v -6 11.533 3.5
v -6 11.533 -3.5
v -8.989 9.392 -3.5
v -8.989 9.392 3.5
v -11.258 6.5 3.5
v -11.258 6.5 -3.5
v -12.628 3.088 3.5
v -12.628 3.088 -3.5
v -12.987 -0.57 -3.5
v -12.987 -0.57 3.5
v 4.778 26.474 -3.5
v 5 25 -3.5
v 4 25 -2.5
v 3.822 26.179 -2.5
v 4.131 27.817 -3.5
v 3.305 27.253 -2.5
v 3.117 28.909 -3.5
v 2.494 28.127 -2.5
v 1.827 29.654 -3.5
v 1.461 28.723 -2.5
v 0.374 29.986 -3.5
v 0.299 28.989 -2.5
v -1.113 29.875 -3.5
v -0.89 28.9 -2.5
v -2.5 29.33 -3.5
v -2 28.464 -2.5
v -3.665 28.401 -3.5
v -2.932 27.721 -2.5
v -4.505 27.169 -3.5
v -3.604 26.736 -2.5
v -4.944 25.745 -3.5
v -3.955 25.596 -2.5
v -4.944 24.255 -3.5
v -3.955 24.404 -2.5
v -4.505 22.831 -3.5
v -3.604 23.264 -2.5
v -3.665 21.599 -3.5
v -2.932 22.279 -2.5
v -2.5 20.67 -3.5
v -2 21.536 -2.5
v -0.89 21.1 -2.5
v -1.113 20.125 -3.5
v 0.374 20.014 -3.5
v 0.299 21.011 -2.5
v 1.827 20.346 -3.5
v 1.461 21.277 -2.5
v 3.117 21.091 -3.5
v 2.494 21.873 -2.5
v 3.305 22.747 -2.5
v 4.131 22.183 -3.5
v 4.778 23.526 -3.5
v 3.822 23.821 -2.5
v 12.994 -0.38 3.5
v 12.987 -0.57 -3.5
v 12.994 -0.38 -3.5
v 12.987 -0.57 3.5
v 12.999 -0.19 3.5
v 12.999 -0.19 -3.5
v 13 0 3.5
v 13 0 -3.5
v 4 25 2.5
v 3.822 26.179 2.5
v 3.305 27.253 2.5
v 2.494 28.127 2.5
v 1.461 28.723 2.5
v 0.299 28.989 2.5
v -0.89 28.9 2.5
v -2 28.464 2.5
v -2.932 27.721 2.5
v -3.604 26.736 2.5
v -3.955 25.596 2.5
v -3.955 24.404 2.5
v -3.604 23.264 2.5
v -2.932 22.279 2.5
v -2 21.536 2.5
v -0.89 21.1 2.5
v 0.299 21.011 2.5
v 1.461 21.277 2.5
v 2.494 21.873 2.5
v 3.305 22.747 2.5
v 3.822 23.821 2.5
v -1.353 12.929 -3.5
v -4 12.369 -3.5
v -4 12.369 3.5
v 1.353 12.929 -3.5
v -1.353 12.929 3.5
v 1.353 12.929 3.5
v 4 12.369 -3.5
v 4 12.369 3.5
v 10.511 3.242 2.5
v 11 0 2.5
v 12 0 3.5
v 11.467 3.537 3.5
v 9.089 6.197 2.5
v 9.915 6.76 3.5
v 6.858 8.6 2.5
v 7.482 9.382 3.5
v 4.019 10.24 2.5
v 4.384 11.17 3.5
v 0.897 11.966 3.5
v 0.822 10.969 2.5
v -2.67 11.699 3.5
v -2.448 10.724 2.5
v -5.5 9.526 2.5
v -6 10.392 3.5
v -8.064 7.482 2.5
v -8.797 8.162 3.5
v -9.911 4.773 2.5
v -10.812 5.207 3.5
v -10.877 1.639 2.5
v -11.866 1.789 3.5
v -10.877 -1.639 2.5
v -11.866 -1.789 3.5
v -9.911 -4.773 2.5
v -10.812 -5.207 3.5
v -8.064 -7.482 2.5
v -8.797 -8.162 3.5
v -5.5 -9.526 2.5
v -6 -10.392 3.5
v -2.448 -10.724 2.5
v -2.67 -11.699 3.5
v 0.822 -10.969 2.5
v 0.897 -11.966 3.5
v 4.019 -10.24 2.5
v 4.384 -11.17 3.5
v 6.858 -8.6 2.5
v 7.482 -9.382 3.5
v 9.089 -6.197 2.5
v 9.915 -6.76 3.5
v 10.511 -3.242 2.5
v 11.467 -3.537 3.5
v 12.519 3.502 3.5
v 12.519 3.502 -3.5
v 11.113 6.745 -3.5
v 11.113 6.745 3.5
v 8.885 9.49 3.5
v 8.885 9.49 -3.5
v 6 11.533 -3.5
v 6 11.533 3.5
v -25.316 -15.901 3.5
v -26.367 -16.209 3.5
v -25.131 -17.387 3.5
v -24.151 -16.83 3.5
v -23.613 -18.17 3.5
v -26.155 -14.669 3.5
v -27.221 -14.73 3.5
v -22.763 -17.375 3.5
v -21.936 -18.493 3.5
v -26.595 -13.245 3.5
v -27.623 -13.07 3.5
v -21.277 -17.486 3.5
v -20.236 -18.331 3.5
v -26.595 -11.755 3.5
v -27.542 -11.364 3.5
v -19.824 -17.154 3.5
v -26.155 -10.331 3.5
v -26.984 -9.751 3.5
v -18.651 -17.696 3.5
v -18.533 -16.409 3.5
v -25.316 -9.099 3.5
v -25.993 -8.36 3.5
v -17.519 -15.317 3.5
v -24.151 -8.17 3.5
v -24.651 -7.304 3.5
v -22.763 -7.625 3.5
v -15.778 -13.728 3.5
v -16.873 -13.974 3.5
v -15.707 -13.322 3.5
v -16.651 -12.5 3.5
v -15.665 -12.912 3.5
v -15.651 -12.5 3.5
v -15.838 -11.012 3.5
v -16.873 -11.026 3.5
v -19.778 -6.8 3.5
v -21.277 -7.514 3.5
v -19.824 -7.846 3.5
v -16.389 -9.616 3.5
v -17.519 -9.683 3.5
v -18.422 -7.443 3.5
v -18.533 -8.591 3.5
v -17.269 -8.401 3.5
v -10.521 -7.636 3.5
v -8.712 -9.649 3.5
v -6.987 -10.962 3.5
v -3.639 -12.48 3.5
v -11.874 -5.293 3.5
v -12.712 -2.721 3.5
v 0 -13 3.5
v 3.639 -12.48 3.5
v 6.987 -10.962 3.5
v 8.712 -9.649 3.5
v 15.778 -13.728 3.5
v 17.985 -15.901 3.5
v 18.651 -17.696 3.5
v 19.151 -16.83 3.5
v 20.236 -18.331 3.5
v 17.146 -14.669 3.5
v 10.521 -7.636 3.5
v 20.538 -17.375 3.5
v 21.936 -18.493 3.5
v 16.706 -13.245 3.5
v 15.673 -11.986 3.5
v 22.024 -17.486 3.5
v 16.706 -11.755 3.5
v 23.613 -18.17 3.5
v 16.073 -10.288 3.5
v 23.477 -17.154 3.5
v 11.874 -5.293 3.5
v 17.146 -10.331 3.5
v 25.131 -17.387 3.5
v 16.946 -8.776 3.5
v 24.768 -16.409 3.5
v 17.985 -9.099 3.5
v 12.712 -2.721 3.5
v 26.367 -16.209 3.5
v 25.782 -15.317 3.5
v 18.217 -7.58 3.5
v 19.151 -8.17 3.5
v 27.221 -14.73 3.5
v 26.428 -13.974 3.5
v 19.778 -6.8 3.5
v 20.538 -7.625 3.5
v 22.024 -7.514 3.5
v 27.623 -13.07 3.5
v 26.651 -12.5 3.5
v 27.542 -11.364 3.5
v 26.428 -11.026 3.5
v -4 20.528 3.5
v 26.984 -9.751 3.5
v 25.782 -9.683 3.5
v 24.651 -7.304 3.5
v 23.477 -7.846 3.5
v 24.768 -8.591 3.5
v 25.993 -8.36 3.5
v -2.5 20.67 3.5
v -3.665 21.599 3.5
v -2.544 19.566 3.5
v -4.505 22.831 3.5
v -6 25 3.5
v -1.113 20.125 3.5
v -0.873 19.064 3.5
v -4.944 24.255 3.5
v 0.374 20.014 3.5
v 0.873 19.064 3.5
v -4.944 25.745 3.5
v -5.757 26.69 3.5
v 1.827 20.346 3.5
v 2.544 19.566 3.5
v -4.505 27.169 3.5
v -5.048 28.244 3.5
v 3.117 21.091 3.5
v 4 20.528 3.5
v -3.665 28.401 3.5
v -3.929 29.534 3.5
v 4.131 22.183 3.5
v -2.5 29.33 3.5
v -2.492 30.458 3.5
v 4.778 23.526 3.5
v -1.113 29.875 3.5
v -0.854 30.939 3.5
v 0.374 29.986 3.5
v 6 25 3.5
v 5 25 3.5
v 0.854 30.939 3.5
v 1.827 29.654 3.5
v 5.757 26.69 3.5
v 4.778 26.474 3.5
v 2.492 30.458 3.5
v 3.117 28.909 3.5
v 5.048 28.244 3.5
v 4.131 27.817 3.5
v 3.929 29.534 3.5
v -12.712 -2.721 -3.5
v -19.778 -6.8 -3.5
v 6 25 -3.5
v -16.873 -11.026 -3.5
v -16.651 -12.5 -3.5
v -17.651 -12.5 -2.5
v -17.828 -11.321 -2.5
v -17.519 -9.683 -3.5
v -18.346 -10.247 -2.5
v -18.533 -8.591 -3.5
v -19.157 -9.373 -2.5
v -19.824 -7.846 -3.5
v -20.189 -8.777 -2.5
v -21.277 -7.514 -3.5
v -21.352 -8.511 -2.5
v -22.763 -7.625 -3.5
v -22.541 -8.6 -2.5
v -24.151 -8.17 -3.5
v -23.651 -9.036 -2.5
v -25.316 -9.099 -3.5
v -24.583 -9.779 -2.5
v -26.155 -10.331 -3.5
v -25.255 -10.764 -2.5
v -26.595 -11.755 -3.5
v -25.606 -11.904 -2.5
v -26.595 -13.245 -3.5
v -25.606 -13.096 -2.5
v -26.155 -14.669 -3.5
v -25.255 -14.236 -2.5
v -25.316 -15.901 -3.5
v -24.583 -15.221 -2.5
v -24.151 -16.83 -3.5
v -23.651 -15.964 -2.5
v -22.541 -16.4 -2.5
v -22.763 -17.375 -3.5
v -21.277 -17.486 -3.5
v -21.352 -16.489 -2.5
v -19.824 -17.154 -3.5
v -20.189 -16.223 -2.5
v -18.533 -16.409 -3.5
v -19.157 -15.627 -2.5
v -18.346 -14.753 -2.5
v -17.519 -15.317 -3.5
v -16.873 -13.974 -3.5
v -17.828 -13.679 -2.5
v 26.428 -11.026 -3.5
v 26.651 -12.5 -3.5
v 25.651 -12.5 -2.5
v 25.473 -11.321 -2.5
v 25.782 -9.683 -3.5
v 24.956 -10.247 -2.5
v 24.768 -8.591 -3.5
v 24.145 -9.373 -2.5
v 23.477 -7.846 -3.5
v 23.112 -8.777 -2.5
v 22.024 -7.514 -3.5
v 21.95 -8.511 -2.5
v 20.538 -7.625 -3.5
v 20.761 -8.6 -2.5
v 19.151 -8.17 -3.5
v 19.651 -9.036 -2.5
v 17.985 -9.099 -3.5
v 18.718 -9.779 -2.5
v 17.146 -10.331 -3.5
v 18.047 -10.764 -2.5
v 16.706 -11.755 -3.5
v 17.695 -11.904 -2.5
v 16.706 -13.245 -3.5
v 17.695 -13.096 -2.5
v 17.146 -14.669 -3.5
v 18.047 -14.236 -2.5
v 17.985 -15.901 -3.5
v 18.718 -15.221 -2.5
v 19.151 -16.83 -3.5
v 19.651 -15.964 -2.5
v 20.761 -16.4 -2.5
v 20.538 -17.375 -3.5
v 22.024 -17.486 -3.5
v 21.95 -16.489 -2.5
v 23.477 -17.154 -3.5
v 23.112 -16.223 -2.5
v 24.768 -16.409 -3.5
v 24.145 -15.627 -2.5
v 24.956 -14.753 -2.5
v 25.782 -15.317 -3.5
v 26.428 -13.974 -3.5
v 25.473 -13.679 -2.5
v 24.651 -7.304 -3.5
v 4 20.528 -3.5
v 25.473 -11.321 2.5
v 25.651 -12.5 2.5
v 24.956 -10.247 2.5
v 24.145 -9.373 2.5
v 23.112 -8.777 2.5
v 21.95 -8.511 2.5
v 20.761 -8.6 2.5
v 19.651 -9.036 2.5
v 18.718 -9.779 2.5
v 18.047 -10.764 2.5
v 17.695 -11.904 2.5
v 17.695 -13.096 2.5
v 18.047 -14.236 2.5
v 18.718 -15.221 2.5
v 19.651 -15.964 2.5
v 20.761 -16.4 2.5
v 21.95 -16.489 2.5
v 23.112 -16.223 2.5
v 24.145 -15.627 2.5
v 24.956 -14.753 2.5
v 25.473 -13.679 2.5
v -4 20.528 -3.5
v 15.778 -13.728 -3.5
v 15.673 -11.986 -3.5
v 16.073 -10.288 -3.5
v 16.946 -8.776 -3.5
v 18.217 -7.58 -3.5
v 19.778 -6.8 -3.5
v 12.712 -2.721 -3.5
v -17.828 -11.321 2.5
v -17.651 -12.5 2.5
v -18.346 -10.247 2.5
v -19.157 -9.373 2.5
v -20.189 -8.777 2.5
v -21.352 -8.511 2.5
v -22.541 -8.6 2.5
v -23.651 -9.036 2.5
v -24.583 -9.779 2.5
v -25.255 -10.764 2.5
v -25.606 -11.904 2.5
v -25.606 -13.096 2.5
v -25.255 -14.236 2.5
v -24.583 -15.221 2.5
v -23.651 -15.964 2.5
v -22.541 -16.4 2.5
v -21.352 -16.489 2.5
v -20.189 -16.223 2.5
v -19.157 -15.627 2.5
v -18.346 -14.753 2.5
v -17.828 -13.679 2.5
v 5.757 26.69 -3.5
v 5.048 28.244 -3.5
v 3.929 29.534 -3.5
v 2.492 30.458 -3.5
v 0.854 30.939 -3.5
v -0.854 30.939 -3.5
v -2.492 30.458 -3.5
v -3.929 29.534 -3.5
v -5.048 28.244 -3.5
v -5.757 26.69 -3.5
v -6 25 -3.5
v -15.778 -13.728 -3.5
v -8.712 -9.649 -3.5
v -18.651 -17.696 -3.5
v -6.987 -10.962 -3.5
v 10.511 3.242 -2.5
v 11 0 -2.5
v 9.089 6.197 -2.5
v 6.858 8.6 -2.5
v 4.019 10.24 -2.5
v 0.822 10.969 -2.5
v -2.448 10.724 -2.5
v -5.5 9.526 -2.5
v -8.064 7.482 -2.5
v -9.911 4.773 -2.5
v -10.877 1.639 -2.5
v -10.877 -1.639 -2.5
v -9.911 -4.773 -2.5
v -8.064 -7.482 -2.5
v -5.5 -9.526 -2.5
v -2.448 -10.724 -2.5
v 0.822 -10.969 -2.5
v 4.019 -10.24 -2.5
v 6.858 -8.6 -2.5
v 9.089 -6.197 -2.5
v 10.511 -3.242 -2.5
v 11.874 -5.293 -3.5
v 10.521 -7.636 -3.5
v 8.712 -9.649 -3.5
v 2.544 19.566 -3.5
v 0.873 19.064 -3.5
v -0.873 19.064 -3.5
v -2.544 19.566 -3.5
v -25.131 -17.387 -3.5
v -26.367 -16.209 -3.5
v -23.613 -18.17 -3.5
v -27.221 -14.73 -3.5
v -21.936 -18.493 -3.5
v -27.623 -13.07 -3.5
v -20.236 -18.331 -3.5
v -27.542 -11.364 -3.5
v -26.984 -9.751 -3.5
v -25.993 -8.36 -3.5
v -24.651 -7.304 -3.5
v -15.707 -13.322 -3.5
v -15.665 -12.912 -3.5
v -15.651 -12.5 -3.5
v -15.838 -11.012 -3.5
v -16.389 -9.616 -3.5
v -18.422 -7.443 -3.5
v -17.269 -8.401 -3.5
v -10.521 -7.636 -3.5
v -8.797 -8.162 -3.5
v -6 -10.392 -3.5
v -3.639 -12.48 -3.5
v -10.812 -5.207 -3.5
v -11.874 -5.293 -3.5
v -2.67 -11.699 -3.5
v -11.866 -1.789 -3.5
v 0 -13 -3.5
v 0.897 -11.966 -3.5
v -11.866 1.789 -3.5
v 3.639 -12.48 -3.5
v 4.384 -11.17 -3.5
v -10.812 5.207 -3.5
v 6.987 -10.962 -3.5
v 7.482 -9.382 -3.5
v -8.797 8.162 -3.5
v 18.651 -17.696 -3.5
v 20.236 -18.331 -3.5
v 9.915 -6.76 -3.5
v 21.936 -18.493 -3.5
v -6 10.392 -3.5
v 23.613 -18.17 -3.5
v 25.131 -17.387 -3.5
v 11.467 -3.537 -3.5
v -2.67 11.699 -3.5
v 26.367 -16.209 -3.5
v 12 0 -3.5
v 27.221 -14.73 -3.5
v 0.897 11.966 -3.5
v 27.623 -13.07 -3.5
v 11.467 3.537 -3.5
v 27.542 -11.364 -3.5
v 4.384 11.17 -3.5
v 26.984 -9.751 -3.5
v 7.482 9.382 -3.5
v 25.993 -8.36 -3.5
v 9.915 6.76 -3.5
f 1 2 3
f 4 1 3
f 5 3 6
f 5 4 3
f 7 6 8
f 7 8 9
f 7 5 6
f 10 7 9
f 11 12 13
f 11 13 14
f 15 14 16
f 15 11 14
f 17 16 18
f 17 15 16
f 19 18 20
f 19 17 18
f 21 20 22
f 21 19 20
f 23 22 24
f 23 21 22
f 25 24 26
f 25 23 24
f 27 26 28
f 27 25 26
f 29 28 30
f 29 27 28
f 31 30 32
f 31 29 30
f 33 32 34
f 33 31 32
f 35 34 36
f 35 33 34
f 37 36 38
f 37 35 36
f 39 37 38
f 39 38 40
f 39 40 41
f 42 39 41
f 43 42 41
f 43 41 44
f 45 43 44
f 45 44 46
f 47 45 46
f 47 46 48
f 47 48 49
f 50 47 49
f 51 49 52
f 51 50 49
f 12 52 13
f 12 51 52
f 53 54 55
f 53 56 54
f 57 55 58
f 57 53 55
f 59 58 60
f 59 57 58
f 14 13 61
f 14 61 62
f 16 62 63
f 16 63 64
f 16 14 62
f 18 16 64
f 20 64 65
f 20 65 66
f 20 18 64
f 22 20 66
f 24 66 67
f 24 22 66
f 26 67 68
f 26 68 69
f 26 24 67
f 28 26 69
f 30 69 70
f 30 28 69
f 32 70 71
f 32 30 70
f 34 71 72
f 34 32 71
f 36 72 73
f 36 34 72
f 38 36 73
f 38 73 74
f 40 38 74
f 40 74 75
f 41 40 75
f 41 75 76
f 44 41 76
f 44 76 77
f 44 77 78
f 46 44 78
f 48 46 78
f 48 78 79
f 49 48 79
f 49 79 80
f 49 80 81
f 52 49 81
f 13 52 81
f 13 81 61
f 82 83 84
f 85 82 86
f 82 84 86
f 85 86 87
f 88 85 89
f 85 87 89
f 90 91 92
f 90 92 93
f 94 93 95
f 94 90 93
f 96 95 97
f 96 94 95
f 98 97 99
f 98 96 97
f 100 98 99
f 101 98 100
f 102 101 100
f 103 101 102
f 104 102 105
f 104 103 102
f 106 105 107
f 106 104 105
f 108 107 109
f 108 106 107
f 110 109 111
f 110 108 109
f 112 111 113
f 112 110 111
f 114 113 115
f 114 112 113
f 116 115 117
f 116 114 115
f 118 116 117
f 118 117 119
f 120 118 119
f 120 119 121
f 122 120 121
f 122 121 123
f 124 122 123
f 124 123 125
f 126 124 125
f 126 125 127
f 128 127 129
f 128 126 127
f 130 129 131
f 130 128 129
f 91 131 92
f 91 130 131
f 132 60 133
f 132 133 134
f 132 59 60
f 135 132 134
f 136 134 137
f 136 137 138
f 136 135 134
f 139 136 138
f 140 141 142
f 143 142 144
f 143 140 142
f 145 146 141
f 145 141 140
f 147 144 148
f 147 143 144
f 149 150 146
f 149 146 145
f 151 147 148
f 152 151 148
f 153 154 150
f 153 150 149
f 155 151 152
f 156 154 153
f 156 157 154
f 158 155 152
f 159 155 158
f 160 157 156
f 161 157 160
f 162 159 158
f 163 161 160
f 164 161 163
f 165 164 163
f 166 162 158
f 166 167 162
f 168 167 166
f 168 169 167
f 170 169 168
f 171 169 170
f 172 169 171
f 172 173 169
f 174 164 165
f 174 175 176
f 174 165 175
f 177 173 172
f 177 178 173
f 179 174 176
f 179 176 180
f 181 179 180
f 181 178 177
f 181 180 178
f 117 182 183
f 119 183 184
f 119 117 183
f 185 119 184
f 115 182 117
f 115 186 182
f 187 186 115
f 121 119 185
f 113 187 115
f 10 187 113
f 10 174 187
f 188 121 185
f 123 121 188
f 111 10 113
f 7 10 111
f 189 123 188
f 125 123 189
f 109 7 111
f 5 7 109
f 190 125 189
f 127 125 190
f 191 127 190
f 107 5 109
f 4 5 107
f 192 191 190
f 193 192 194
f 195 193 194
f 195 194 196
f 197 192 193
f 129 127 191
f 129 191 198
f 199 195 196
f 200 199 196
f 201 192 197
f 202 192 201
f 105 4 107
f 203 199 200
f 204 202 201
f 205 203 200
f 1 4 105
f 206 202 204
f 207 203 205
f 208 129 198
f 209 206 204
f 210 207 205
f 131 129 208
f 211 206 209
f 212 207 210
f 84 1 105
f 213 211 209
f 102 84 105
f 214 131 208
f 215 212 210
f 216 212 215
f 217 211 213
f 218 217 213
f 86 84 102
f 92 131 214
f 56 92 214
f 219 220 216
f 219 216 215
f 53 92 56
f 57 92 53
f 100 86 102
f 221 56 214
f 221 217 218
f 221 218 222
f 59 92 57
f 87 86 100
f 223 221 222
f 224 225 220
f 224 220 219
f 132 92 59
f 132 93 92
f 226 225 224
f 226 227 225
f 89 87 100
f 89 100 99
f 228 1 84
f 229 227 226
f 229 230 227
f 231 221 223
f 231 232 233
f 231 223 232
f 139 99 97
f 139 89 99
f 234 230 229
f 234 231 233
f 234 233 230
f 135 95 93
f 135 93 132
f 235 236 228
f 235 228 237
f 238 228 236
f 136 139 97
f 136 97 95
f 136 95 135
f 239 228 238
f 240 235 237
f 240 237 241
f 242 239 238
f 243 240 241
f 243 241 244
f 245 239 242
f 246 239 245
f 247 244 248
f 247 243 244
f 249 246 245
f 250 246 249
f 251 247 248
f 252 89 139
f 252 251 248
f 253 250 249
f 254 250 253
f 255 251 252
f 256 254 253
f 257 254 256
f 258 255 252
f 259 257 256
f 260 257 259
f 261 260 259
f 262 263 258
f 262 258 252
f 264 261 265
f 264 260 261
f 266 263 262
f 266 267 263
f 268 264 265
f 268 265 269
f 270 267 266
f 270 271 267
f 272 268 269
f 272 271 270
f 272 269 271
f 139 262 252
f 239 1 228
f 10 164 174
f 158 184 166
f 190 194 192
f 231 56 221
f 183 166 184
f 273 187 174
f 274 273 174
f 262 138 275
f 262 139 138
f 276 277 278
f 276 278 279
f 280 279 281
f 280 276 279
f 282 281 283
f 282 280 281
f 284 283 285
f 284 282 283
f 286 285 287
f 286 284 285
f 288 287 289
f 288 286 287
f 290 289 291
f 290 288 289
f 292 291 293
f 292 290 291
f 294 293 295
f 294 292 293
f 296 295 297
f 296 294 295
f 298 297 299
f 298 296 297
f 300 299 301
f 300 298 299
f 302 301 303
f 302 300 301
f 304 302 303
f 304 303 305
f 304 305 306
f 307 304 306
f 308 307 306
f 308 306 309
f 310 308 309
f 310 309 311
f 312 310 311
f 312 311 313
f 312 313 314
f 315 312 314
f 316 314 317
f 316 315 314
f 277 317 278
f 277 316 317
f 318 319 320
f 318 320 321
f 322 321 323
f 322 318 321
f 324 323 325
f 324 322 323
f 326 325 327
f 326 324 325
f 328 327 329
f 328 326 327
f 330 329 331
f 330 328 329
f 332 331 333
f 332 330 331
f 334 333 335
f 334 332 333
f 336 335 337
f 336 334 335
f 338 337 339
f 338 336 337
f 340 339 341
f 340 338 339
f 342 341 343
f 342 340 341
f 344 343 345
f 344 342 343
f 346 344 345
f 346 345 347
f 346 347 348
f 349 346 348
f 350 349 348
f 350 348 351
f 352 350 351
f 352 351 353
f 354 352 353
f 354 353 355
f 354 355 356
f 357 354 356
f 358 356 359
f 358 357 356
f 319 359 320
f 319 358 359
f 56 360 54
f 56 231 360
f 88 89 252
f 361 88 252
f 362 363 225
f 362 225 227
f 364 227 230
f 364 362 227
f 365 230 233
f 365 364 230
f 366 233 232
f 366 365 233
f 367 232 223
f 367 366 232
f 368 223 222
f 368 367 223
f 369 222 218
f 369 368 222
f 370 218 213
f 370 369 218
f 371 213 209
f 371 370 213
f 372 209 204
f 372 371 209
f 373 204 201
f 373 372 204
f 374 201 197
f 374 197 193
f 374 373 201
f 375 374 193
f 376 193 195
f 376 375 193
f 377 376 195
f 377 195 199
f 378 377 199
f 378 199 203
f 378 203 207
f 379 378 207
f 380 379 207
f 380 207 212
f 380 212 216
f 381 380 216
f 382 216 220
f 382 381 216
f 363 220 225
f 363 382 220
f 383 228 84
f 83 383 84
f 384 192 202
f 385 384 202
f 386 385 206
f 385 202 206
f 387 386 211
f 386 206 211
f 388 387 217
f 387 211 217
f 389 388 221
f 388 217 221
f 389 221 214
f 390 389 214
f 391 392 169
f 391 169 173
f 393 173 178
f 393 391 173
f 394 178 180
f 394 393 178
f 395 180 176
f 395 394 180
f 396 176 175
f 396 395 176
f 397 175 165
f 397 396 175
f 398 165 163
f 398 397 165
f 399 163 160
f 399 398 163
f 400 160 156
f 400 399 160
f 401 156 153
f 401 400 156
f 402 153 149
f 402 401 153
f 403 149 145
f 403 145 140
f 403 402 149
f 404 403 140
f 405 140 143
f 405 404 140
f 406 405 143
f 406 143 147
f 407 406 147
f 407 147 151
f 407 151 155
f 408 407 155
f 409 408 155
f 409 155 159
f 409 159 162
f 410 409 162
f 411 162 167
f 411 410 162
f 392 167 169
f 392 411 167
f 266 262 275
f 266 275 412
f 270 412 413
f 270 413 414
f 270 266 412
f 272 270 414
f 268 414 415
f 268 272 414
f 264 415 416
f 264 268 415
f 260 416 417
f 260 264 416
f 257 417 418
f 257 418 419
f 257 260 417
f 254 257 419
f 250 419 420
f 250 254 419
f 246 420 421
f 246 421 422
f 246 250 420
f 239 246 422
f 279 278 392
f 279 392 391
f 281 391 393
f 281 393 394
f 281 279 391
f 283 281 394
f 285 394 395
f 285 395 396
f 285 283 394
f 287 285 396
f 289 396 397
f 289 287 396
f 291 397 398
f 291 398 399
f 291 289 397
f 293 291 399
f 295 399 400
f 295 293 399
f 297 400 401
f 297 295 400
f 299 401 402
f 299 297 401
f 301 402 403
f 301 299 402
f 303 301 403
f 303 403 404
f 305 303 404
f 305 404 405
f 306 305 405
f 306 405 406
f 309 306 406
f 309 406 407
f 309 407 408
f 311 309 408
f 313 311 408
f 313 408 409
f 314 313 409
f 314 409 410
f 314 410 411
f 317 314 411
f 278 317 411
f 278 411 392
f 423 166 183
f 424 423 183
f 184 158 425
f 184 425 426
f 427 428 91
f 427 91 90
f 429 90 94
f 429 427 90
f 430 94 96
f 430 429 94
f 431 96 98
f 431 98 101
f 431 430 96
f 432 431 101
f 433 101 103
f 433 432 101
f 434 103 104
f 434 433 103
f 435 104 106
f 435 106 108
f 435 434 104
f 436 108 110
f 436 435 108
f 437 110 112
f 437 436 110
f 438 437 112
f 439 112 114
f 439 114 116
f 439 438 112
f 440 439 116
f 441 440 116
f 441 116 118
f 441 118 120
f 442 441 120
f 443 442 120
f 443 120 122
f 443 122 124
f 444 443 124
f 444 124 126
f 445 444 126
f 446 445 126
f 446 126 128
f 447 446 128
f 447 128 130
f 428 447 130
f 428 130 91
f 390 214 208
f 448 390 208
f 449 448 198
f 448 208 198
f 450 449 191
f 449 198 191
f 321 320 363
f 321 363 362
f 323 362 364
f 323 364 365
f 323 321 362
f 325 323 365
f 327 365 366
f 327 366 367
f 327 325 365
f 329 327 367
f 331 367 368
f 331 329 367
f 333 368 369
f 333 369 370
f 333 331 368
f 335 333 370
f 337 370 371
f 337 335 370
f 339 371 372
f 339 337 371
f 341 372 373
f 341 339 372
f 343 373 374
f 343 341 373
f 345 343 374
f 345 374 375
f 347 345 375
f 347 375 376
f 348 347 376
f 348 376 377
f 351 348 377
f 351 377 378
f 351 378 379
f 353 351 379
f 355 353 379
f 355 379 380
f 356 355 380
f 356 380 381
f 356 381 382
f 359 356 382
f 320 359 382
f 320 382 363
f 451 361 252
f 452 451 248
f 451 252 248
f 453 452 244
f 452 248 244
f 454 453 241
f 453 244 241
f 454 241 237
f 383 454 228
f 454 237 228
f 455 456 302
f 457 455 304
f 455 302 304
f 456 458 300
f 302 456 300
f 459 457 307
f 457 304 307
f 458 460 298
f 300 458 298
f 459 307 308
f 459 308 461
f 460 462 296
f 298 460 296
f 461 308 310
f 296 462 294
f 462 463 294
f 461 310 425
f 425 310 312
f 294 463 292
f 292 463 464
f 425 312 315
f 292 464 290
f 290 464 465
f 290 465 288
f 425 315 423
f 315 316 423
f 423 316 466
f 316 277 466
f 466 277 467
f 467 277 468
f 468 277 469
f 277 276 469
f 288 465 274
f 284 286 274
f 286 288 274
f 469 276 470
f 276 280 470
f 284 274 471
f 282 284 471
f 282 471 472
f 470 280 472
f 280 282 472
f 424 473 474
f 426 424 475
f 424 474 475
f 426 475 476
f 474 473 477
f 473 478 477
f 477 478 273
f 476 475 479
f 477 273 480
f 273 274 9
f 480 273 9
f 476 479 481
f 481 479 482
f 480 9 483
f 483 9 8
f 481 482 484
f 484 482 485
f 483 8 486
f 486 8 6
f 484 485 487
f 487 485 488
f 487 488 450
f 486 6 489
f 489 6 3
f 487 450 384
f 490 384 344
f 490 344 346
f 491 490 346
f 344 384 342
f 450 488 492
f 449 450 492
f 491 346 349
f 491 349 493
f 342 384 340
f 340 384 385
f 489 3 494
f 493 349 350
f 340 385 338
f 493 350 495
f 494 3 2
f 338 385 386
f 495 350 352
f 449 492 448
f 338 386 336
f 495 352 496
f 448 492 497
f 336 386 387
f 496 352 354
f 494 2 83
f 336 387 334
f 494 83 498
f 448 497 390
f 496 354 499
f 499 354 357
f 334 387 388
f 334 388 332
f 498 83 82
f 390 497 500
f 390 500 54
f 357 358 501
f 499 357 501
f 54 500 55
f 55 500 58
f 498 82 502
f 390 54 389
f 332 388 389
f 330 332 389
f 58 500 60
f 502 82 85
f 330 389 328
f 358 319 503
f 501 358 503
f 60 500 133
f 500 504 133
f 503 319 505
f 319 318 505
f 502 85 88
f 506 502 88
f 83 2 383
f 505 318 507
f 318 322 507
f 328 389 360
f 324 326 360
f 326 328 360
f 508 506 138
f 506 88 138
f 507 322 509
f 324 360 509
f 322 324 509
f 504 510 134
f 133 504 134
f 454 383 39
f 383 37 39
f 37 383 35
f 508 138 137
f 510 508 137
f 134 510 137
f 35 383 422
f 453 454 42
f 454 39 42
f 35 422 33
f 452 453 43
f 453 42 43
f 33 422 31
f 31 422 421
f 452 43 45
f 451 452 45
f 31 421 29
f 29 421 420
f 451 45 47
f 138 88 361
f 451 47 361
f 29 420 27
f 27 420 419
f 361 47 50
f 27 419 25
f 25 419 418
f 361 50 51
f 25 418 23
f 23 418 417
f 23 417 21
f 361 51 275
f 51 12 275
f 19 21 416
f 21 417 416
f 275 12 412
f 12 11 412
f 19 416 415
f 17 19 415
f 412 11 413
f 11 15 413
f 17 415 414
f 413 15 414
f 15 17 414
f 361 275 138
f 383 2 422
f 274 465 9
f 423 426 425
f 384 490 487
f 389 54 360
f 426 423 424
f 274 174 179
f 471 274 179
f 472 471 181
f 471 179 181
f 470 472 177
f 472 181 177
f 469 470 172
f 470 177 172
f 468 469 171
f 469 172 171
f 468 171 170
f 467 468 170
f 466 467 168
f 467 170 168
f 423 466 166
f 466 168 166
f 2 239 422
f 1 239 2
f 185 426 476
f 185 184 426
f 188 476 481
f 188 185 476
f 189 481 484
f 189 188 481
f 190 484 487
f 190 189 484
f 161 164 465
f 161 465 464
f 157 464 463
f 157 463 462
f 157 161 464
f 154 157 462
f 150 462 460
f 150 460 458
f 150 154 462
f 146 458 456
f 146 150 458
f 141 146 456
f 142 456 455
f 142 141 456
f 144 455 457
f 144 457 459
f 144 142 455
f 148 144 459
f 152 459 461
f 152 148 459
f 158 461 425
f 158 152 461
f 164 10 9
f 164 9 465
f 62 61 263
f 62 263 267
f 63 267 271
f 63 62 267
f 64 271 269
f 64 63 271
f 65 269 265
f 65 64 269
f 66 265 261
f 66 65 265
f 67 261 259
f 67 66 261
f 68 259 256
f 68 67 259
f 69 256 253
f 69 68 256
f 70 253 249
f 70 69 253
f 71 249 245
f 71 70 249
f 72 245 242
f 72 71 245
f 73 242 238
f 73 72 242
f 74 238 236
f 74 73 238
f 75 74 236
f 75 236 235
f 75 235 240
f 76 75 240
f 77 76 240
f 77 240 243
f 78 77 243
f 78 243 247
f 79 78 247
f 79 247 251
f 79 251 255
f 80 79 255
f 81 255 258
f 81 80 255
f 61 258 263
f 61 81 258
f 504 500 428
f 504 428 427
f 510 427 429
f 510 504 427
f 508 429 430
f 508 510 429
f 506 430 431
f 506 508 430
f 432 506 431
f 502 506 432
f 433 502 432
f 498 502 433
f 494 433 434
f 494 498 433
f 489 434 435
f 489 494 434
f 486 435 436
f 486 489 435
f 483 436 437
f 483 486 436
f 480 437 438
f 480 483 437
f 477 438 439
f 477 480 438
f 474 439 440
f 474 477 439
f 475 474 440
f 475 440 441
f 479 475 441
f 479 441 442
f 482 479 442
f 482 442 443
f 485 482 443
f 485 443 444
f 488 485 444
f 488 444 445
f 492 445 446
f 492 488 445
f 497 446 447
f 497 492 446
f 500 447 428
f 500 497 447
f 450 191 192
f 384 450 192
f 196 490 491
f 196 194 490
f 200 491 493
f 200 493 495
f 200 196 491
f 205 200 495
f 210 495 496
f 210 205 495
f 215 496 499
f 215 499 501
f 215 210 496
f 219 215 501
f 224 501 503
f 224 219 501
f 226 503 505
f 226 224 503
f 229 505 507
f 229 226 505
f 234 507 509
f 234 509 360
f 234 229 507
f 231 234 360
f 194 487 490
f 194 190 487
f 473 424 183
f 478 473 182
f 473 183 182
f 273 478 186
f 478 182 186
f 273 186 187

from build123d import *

# Parameters (mm, degrees)
F0_R     = 11
F0_R_2   = 4
F1_DEPTH = 3.5
F2_SIZE  = 1
F4_DEPTH = 7.001


# Not quite as in the source:
# - a feature names something its author has since deleted; it is built from what else it names


with BuildPart() as f1:
    # F0 (on Top) → F1 (new body, symmetric)
    with BuildSketch(Plane.XY):
        with BuildLine():
            ThreePointArc((-6, 11.5325625947), (0, 13), (6, 11.5325625947))
            Line((6, 11.5325625947), (6, 25))
            ThreePointArc((6, 25), (0, 19), (-6, 25))
            Line((-6, 25), (-6, 11.5325625947))
        make_face()
        with BuildLine():
            ThreePointArc((-6.9874921777, -10.96243372), (-11.2583302492, -6.5), (-12.9874921777, -0.5701288746))
            Line((-12.9874921777, -0.5701288746), (-24.6506350946, -7.3038475773))
            ThreePointArc((-24.6506350946, -7.3038475773), (-18.6506350946, -7.3038475773), (-15.6506350946, -12.5))
            ThreePointArc((-15.6506350946, -12.5), (-16.4544826719, -15.5), (-18.6506350946, -17.6961524227))
            Line((-18.6506350946, -17.6961524227), (-6.9874921777, -10.96243372))
        make_face()
        with BuildLine():
            Line((24.6506350946, -7.3038475773), (12.9874921777, -0.5701288746))
            ThreePointArc((12.9874921777, -0.5701288746), (11.2583302492, -6.5), (6.9874921777, -10.96243372))
            Line((6.9874921777, -10.96243372), (18.6506350946, -17.6961524227))
            ThreePointArc((18.6506350946, -17.6961524227), (16.4544826719, -9.5), (24.6506350946, -7.3038475773))
        make_face()
        with BuildLine():
            ThreePointArc((12.9874921777, -0.5701288746), (12.9968726683, -0.2851330301), (13, 0))
            ThreePointArc((13, 0), (11.1130553854, 6.7453687816), (6, 11.5325625947))
            ThreePointArc((6, 11.5325625947), (0, 13), (-6, 11.5325625947))
            ThreePointArc((-6, 11.5325625947), (-11.2583302492, 6.5), (-12.9874921777, -0.5701288746))
            ThreePointArc((-12.9874921777, -0.5701288746), (-11.2583302492, -6.5), (-6.9874921777, -10.96243372))
            ThreePointArc((-6.9874921777, -10.96243372), (0, -13), (6.9874921777, -10.96243372))
            ThreePointArc((6.9874921777, -10.96243372), (11.2583302492, -6.5), (12.9874921777, -0.5701288746))
        make_face()
        Circle(F0_R, mode=Mode.SUBTRACT)
        with BuildLine():
            ThreePointArc((-6, 25), (0, 19), (6, 25))
            ThreePointArc((6, 25), (0, 31), (-6, 25))
        make_face()
        with Locations((0, 25)):
            Circle(F0_R_2, mode=Mode.SUBTRACT)
        with BuildLine():
            ThreePointArc((-15.6506350946, -12.5), (-18.6506350946, -7.3038475773), (-24.6506350946, -7.3038475773))
            ThreePointArc((-24.6506350946, -7.3038475773), (-26.8467875173, -15.5), (-18.6506350946, -17.6961524227))
            ThreePointArc((-18.6506350946, -17.6961524227), (-16.4544826719, -15.5), (-15.6506350946, -12.5))
        make_face()
        with Locations((-21.6506350946, -12.5)):
            Circle(F0_R_2, mode=Mode.SUBTRACT)
        with BuildLine():
            ThreePointArc((27.6506350946, -12.5), (26.8467875173, -9.5), (24.6506350946, -7.3038475773))
            ThreePointArc((24.6506350946, -7.3038475773), (16.4544826719, -9.5), (18.6506350946, -17.6961524227))
            ThreePointArc((18.6506350946, -17.6961524227), (24.6506350946, -17.6961524227), (27.6506350946, -12.5))
        make_face()
        with Locations((21.6506350946, -12.5)):
            Circle(F0_R_2, mode=Mode.SUBTRACT)
    extrude(amount=F1_DEPTH, both=True)

    # F2
    f2_edges = [f1.edges().sort_by_distance(p)[0] for p in [
        (-4, 25, 3.5),
        (-11, 0, 3.5),
        (-25.650635, -12.5, 3.5),
        (17.650635, -12.5, 3.5),
        (-25.650635, -12.5, -3.5),
        (-11, 0, -3.5),
        (17.650635, -12.5, -3.5),
        (-4, 25, -3.5),
    ]]
    chamfer(f2_edges, length=F2_SIZE)

    # F3 (on face) → F4 (cut, through all)
    with BuildSketch(Plane.XY.offset(3.5)):
        with BuildLine():
            Line((4, 12.3693168769), (4, 20.527864045))
            ThreePointArc((4, 20.527864045), (0, 19), (-4, 20.527864045))
            Line((-4, 20.527864045), (-4, 12.3693168769))
            ThreePointArc((-4, 12.3693168769), (0, 13), (4, 12.3693168769))
        make_face()
        with BuildLine():
            ThreePointArc((-8.7121426428, -9.6487600536), (-11.2583302492, -6.5), (-12.7121426428, -2.7205568233))
            Line((-12.7121426428, -2.7205568233), (-19.7776517484, -6.7998304074))
            ThreePointArc((-19.7776517484, -6.7998304074), (-16.7907019635, -8.9813283811), (-15.6506350946, -12.5))
            ThreePointArc((-15.6506350946, -12.5), (-15.682473733, -13.117292444), (-15.7776517484, -13.7280336376))
            Line((-15.7776517484, -13.7280336376), (-8.7121426428, -9.6487600536))
        make_face()
        with BuildLine():
            Line((19.7776517484, -6.7998304074), (12.7121426428, -2.7205568233))
            ThreePointArc((12.7121426428, -2.7205568233), (11.2583302492, -6.5), (8.7121426428, -9.6487600536))
            Line((8.7121426428, -9.6487600536), (15.7776517484, -13.7280336376))
            ThreePointArc((15.7776517484, -13.7280336376), (16.4544826719, -9.5), (19.7776517484, -6.7998304074))
        make_face()
    extrude(amount=-F4_DEPTH, mode=Mode.SUBTRACT)


solid = f1.part
